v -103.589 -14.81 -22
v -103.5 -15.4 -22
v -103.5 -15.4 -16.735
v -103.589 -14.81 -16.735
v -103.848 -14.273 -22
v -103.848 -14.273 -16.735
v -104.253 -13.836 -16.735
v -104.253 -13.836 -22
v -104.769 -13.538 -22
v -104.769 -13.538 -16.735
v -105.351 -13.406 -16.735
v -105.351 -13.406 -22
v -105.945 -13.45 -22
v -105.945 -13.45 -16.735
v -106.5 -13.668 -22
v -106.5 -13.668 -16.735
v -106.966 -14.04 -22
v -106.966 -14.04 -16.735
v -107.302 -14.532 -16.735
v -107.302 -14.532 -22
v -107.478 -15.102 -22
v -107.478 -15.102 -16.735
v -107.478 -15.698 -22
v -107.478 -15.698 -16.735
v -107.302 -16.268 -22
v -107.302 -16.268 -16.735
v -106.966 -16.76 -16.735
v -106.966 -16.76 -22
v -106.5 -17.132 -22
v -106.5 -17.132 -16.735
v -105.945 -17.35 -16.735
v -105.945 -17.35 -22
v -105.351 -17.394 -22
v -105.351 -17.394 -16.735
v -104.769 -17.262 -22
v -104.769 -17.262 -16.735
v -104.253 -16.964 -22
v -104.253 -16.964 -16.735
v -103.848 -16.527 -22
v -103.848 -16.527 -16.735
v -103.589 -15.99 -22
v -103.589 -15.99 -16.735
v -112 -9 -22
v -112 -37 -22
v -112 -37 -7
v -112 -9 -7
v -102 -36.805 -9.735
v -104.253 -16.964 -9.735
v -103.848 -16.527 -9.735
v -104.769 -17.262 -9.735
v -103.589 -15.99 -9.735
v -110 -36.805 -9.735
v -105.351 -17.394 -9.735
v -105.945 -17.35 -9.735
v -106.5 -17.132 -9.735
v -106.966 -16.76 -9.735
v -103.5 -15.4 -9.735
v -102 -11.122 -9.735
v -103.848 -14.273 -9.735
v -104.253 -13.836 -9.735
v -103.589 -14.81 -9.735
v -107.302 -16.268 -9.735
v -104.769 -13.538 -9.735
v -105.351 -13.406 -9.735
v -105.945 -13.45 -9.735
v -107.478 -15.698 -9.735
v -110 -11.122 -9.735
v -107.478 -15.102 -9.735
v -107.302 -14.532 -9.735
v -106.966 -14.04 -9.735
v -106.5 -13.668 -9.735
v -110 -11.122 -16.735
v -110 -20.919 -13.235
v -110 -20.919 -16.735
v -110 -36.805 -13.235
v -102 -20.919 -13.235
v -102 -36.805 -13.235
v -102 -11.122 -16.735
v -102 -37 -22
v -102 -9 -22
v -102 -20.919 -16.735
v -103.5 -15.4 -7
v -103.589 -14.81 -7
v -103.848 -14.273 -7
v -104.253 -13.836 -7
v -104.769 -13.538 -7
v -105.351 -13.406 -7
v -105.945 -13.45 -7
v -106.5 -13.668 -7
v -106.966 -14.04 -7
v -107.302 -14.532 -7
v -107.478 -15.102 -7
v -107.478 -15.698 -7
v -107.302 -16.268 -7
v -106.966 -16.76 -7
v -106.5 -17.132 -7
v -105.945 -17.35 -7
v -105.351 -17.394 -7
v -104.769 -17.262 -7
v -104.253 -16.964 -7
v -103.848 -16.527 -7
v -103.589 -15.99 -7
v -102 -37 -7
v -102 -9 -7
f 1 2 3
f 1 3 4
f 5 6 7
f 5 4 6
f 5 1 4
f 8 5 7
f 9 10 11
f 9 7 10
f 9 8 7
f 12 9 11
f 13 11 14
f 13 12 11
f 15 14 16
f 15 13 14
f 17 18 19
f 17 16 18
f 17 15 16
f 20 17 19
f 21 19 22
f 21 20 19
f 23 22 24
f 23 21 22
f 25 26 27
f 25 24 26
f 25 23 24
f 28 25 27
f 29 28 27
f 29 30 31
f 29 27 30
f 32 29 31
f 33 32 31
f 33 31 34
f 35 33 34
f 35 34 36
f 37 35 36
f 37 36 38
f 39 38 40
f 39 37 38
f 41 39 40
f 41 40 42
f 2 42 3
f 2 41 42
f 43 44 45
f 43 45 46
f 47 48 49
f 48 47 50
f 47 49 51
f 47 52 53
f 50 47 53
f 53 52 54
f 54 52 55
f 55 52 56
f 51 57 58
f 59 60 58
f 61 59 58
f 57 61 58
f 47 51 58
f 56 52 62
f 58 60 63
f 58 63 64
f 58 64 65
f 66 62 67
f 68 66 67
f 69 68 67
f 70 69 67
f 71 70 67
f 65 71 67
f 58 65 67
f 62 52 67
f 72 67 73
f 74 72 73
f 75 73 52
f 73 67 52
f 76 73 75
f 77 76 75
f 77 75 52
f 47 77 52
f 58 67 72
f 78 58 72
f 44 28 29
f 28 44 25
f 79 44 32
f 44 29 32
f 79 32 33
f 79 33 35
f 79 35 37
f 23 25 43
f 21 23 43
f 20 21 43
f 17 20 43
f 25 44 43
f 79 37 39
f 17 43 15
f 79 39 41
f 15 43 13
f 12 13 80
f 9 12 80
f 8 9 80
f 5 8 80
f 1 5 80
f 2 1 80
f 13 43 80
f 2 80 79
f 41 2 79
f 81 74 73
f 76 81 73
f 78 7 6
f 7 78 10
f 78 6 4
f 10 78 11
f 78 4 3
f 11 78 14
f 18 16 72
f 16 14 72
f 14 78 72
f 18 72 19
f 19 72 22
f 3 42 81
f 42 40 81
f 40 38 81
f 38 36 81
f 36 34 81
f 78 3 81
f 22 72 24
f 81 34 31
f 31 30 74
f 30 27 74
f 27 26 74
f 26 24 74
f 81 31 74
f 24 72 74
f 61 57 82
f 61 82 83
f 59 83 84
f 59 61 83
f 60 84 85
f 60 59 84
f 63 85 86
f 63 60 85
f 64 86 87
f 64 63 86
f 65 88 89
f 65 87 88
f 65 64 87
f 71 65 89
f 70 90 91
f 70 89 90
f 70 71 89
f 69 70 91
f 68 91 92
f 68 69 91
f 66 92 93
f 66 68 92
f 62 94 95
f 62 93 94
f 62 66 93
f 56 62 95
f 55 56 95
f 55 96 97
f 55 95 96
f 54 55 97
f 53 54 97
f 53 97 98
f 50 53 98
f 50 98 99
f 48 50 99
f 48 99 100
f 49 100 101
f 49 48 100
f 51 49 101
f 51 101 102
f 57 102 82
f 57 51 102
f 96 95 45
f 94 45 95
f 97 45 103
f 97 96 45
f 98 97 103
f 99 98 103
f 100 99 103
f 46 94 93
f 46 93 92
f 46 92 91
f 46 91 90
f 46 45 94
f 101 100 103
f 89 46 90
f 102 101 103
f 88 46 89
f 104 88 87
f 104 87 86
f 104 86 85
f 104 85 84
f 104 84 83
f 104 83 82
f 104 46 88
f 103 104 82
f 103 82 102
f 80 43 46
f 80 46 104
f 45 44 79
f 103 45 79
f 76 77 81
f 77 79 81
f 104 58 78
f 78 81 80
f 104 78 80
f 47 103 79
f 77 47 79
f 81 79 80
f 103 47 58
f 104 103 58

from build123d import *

# Parameters (mm, degrees)
CYLINDER011_R     = 2
CYLINDER011_DEPTH = 50
PAD002_DEPTH      = 30
BOX007_W          = 10
BOX007_H          = 28
BOX007_DEPTH      = 15


with BuildPart() as cylinder011:
    # Cylinder011 → Cylinder011 (new body)
    with BuildSketch(Plane(origin=(-105.5, -15.4, -37), x_dir=(1, 0, 0), z_dir=(0, 0, 1))):
        Circle(CYLINDER011_R)
    extrude(amount=CYLINDER011_DEPTH)


with BuildPart() as fusion001006:
    # Sketch002 → Pad002 (new body)
    with BuildSketch(Plane.YZ):
        Polygon((-36.805373, -9.734821), (-11.122054, -9.734821), (-11.122054, -16.734821), (-20.919355, -16.734821), (-20.919355, -13.234821), (-36.805373, -13.234821), align=None)
    extrude(amount=PAD002_DEPTH)


with BuildPart() as fusion001006_1:
    # Body002 placement: moved
    add(fusion001006.part.moved(Location((-110, 0, 0))))

    # Fusion001006: union Cylinder011
    add(cylinder011.part)


with BuildPart() as cut010:
    # Box007 → Box007 (new body)
    with BuildSketch(Plane(origin=(-112, -37, -22), x_dir=(1, 0, 0), z_dir=(0, 0, 1))):
        with Locations((5, 14)):
            Rectangle(BOX007_W, BOX007_H)
    extrude(amount=BOX007_DEPTH)

    # Cut010: cut Fusion001006
    add(fusion001006_1.part, mode=Mode.SUBTRACT)


solid = cut010.part
